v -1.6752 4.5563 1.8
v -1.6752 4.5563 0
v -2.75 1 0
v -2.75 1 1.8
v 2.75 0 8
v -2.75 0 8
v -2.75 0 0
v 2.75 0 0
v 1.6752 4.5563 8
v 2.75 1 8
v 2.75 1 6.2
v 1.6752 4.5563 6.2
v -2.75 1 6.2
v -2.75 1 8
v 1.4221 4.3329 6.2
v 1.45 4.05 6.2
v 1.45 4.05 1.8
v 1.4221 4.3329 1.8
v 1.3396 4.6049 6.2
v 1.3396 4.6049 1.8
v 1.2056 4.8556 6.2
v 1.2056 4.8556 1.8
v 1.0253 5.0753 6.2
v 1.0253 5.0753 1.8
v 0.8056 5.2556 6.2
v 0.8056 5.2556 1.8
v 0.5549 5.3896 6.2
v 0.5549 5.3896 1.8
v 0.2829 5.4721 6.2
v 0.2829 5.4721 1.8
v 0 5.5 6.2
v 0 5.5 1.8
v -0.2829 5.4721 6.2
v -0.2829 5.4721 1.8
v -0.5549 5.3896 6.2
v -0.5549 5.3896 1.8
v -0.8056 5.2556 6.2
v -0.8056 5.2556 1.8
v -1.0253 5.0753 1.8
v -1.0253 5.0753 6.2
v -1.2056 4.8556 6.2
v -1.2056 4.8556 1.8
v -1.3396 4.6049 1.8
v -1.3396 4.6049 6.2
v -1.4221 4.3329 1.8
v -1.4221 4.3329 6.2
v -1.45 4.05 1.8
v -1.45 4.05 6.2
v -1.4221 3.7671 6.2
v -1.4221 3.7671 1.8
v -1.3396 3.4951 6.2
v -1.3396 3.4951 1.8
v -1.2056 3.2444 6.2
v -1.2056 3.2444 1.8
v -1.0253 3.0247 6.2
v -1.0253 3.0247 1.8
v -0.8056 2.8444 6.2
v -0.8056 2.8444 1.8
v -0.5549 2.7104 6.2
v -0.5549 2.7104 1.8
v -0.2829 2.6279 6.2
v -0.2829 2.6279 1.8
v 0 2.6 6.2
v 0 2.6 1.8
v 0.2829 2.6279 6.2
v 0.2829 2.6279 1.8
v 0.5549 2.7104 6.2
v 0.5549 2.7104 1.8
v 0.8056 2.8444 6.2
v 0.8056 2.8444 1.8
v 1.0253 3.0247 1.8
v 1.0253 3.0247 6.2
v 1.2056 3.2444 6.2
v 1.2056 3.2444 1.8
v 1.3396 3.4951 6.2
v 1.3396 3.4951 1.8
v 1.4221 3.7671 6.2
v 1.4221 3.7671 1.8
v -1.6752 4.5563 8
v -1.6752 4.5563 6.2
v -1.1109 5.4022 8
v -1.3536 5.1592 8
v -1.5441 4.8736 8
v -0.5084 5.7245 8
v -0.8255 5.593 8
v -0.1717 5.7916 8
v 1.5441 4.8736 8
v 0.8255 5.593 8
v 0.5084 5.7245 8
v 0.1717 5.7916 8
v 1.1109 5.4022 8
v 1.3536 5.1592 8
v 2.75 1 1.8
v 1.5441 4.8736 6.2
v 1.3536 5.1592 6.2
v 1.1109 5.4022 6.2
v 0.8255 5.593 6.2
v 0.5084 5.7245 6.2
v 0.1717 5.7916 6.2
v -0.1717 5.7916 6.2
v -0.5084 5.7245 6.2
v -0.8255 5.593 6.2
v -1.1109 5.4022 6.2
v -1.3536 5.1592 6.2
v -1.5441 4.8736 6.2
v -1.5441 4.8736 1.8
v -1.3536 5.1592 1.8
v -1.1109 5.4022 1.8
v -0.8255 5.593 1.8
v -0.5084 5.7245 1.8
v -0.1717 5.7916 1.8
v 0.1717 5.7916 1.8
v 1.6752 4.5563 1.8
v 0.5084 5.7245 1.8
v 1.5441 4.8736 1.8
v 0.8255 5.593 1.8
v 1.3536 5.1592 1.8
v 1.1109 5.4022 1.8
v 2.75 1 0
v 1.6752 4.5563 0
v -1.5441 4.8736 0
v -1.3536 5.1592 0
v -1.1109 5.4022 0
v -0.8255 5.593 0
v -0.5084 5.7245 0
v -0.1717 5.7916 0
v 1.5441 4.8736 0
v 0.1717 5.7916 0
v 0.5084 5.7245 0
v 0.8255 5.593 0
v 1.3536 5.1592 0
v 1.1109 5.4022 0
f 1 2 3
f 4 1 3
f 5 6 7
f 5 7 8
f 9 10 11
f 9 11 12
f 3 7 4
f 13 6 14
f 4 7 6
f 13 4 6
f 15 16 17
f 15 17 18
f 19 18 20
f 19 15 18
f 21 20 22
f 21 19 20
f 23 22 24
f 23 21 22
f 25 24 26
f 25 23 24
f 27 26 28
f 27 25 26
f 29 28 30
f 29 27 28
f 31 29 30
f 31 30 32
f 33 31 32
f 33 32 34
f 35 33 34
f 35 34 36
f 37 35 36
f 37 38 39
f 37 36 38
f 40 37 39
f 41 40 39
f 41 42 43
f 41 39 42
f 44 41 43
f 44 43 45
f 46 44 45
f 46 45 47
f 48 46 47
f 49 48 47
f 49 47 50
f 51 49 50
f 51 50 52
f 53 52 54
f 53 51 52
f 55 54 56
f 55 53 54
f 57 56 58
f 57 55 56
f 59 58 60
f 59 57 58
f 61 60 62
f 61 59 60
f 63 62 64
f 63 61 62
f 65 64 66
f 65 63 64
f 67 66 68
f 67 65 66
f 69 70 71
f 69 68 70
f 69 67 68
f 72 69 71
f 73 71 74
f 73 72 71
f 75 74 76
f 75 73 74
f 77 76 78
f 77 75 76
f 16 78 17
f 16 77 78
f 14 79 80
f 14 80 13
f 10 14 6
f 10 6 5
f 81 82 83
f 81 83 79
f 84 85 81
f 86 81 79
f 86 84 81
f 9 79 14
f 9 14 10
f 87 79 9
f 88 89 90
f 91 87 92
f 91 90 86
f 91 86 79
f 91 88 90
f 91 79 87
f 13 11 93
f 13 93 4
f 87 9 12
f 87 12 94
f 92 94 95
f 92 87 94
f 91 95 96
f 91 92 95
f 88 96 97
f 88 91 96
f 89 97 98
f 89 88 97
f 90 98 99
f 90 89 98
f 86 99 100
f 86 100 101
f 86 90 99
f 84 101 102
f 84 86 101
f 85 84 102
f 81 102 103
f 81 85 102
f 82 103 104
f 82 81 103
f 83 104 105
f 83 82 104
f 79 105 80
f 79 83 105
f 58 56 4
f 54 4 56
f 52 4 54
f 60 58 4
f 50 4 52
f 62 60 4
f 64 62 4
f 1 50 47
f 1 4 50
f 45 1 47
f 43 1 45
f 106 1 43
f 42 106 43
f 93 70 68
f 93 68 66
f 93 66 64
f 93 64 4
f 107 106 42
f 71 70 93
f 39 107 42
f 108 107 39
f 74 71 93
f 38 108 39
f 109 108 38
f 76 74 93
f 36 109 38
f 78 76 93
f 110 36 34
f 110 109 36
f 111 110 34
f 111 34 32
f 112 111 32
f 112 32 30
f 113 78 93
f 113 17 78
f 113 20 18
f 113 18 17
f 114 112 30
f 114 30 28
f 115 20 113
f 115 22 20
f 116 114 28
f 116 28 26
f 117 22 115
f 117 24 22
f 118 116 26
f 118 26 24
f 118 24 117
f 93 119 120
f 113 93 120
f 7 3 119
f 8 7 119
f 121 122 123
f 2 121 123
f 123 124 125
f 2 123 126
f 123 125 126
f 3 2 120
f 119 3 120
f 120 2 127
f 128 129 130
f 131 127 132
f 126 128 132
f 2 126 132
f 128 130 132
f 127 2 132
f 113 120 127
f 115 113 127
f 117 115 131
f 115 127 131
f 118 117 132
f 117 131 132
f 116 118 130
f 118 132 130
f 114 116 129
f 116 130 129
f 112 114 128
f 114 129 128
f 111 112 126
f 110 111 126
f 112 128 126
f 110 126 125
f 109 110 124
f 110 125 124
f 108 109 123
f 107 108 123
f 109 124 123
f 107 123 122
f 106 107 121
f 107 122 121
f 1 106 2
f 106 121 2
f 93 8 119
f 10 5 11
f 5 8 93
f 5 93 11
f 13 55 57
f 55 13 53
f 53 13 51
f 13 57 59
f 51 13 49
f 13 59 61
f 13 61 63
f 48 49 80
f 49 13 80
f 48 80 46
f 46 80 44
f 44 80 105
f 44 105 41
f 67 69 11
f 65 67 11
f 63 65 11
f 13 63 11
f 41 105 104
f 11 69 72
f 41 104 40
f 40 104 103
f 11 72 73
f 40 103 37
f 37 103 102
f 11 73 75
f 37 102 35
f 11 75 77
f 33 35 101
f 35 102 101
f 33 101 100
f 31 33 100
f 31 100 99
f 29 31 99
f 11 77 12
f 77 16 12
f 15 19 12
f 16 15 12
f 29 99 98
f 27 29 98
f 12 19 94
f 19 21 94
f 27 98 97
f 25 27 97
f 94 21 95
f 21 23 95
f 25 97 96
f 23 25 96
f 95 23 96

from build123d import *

# Parameters (mm, degrees)
F0_W     = 2.75
F0_H     = 1
F0_R     = 1.45
F1_DEPTH = 1.8
F2_DEPTH = 4


# Not quite as in the source:
# - a feature of the source that left no trace in its solid (it failed there, or was rolled back) is left out


with BuildPart() as f1:
    # F0 (on Top) → F1 (new body)
    with BuildSketch(Plane.XY):
        with Locations((1.375, 0.5)):
            Rectangle(F0_W, F0_H)
        with Locations((-1.375, 0.5)):
            Rectangle(F0_W, F0_H)
        with BuildLine():
            Line((0, 2.3), (0, 1))
            Line((0, 1), (2.75, 1))
            Line((2.75, 1), (1.675161779, 4.5562934073))
            ThreePointArc((1.675161779, 4.5562934073), (1.7311893474, 4.3058973298), (1.75, 4.05))
            ThreePointArc((1.75, 4.05), (1.2374368671, 2.8125631329), (0, 2.3))
        make_face()
        with BuildLine():
            Line((-2.75, 1), (0, 1))
            Line((0, 1), (0, 2.3))
            ThreePointArc((0, 2.3), (-1.4050824643, 3.0068110101), (-1.675161779, 4.5562934073))
            Line((-1.675161779, 4.5562934073), (-2.75, 1))
        make_face()
        with BuildLine():
            ThreePointArc((-1.675161779, 4.5562934073), (-1.4050824643, 3.0068110101), (0, 2.3))
            ThreePointArc((0, 2.3), (1.2374368671, 2.8125631329), (1.75, 4.05))
            ThreePointArc((1.75, 4.05), (1.7311893474, 4.3058973298), (1.675161779, 4.5562934073))
            ThreePointArc((1.675161779, 4.5562934073), (0, 5.8), (-1.675161779, 4.5562934073))
        make_face()
        with Locations((0, 4.05)):
            Circle(F0_R, mode=Mode.SUBTRACT)
        with Locations((0, 4.05)):
            Circle(F0_R)
    extrude(amount=F1_DEPTH)

    # F0 (on Top) → F2 (join)
    with BuildSketch(Plane.XY):
        with Locations((0, 4.05)):
            Circle(F0_R)
        with Locations((-1.375, 0.5)):
            Rectangle(F0_W, F0_H)
        with Locations((1.375, 0.5)):
            Rectangle(F0_W, F0_H)
    extrude(amount=F2_DEPTH)

    # F4: F1 across plane


with BuildPart() as f1_1:
    add(f1.part)
    add(f1.part.mirror(Plane.XY.offset(4)))


solid = f1_1.part
